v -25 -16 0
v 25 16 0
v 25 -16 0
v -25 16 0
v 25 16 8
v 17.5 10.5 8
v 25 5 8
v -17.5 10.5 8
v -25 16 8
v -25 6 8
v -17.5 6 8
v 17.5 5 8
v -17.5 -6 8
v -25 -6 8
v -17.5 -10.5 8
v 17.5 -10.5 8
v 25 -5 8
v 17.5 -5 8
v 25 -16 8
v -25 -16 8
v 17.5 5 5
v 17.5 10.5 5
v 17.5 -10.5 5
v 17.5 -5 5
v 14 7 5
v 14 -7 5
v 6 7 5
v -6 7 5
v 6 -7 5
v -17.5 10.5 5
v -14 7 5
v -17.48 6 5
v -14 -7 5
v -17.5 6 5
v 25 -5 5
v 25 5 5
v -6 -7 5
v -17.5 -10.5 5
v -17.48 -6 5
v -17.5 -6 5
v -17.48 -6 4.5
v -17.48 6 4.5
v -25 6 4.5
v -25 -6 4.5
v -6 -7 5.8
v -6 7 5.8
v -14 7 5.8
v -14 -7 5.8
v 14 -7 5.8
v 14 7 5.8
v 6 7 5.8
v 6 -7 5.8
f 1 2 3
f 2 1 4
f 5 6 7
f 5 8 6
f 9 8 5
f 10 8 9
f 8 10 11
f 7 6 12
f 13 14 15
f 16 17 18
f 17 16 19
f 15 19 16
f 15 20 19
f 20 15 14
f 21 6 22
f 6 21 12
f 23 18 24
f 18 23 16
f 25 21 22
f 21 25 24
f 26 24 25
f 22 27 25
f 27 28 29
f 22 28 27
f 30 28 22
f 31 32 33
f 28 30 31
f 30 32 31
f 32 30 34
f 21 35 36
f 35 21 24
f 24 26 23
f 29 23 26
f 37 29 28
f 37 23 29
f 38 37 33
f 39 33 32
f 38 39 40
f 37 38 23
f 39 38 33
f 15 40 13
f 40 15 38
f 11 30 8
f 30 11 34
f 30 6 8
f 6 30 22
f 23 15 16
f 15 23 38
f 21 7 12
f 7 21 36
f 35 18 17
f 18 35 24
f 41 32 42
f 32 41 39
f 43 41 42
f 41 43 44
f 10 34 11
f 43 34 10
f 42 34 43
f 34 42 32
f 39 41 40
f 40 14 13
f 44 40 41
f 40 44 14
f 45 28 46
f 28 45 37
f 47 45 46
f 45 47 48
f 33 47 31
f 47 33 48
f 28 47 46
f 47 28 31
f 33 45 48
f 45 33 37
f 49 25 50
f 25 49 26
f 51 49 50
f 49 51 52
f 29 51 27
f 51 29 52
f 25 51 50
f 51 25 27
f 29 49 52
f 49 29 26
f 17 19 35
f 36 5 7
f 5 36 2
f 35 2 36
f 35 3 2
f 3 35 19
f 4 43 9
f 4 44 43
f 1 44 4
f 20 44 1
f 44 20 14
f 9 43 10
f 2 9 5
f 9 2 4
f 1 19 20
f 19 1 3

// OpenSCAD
// file: single-jack-bench-termination-nest.scad
// Original shallow bench fixture; all dimensions in mm.
// Defaults are UNMEASURED example geometry, not a keystone compatibility claim.
part = "nest"; // [nest, contact_coupon]
base_length = 92;
base_width = 60;
base_thickness = 8;
base_radius = 4;
jack_length = 34;
jack_width = 20;
recess_depth = 3;
recess_clearance = 0.5; // Per side, loose location only.
support_land_width = 8; // X dimension of each raised bearing land.
support_land_length = 14; // Y dimension; both lands centered on Y=0.
support_land_spacing = 20; // X center-to-center separation.
support_land_height = 0.8;
cable_exit_width = 10;
latch_relief_width = 12;
latch_relief_length = 10; // Beyond the -X recess edge.
latch_relief_extra_depth = 0.5;
ear_width = 24; // X dimension.
ear_projection = 22; // Beyond each +/-Y edge of base.
ear_overlap = 8; // Join inside base; no holes or captive hardware.
ear_radius = 3;
clamp_pad_length = 14; // Actual pad X envelope, including pad articulation.
clamp_pad_width = 12; // Actual pad Y envelope.
clamp_pad_margin = 1;
coupon_length = 50;
coupon_width = 32;
// Measured lowest tool/hand working envelope above the bearing surface.
// The whole actual swept tool envelope must clear every fixture feature.
tool_bottom_above_support = 8;
tool_envelope_length = 40;
tool_envelope_width = 30;
minimum_floor = 3;
minimum_wall = 4;
minimum_land_width = 6;
minimum_land_length = 12;
minimum_ear_join = 4;
minimum_access_gap = 1;
$fn = 48;

cut_epsilon = 0.02;
recess_length = jack_length + 2 * recess_clearance;
recess_width = jack_width + 2 * recess_clearance;
floor_z = base_thickness - recess_depth;
support_z = floor_z + support_land_height;
ear_length = ear_projection + ear_overlap;

assert(part == "nest" || part == "contact_coupon", "part must be nest or contact_coupon");
assert(base_length > 0 && base_width > 0 && base_thickness > 0,
    "base dimensions must be positive");
assert(minimum_floor >= 3 && minimum_wall >= 4 && minimum_land_width >= 6 &&
    minimum_land_length >= 12 && minimum_ear_join >= 4 && minimum_access_gap >= 1,
    "minimum structural and access guards cannot be reduced");
assert(base_radius > 0 && base_radius < min(base_length, base_width) / 2,
    "base radius must preserve a straight-sided base");
assert(jack_length > 0 && jack_width > 0 && recess_depth > 0,
    "jack envelope and recess depth must be positive");
assert(recess_clearance > 0 && recess_clearance <= 2,
    "recess clearance must be positive and at most 2 mm per side");
assert(floor_z >= minimum_floor && floor_z - latch_relief_extra_depth >= minimum_floor,
    "recess and latch relief must preserve minimum floor");
assert(recess_length + 2 * (minimum_wall + base_radius) <= base_length &&
    recess_width + 2 * (minimum_wall + base_radius) <= base_width,
    "recess must preserve broad perimeter walls");
assert(support_land_width >= minimum_land_width && support_land_length >= minimum_land_length &&
    support_land_height > 0 && support_land_height <= recess_depth - minimum_access_gap,
    "support lands must retain broad bearing faces below locating walls");
assert(support_land_spacing > support_land_width &&
    support_land_spacing + support_land_width <= jack_length - 2 &&
    support_land_length <= jack_width - 2,
    "support lands must remain separated and inside housing footprint");
assert(cable_exit_width > 0 && cable_exit_width <= jack_width - 2,
    "cable exit must be open and narrower than housing");
assert(latch_relief_width > 0 && latch_relief_width <= jack_width - 2 &&
    latch_relief_length > 0 && latch_relief_extra_depth >= 0,
    "latch relief must be positive and inside housing width");
assert(latch_relief_length + recess_length / 2 <= base_length / 2 - minimum_wall,
    "latch relief must retain base end wall");
assert(ear_width > 0 && ear_projection > 0 && ear_overlap - ear_radius >= minimum_ear_join &&
    ear_overlap < base_width / 2 && ear_radius > 0 &&
    2 * ear_radius < min(ear_width, ear_length) &&
    ear_width + 2 * base_radius <= base_length,
    "ears must retain broad connected joins");
assert(clamp_pad_length > 0 && clamp_pad_width > 0 && clamp_pad_margin >= 1 &&
    ear_width - 2 * ear_radius >= clamp_pad_length + 2 * clamp_pad_margin &&
    ear_projection - 2 * ear_radius >= clamp_pad_width + 2 * clamp_pad_margin,
    "clamp pads must fit wholly on external ear flats");
assert(coupon_length >= recess_length + 2 * minimum_wall && coupon_length <= base_length &&
    coupon_width >= recess_width + 2 * minimum_wall && coupon_width <= base_width - 2 * base_radius,
    "contact coupon must retain recess walls and both lands");
assert(tool_envelope_length > 0 && tool_envelope_width > 0 &&
    tool_bottom_above_support > 0 &&
    support_z + tool_bottom_above_support >= base_thickness + minimum_access_gap,
    "tool envelope must clear fixture top by minimum access gap");

module rounded_outline(length, width, radius) {
    hull() for (x = [-length / 2 + radius, length / 2 - radius])
        for (y = [-width / 2 + radius, width / 2 - radius])
            translate([x, y]) circle(r = radius);
}

module stock() {
    linear_extrude(base_thickness) union() {
        rounded_outline(base_length, base_width, base_radius);
        for (side = [-1, 1])
            translate([0, side * (base_width / 2 + (ear_projection - ear_overlap) / 2)])
                rounded_outline(ear_width, ear_length, ear_radius);
    }
}

module nest() {
    union() {
        difference() {
            stock();
            // Flat continuous floor backs two raised housing bearing lands.
            translate([-recess_length / 2, -recess_width / 2, floor_z])
                cube([recess_length, recess_width, recess_depth + cut_epsilon]);
            // +X cable channel opens through the outer base edge.
            translate([recess_length / 2 - cut_epsilon, -cable_exit_width / 2, floor_z])
                cube([base_length / 2 + cut_epsilon, cable_exit_width, recess_depth + cut_epsilon]);
            // -X latch pocket is deeper than the contact floor and never a latch stop.
            translate([-recess_length / 2 - latch_relief_length, -latch_relief_width / 2,
                floor_z - latch_relief_extra_depth])
                cube([latch_relief_length + cut_epsilon, latch_relief_width,
                    recess_depth + latch_relief_extra_depth + cut_epsilon]);
        }
        for (side = [-1, 1])
            translate([side * support_land_spacing / 2 - support_land_width / 2,
                -support_land_length / 2, floor_z - cut_epsilon])
                cube([support_land_width, support_land_length, support_land_height + cut_epsilon]);
    }
}

if (part == "contact_coupon") {
    // Exact-source crop: both contact lands, full recess width, open channel stubs.
    intersection() {
        nest();
        translate([-coupon_length / 2, -coupon_width / 2, -cut_epsilon])
            cube([coupon_length, coupon_width, base_thickness + 2 * cut_epsilon]);
    }
} else nest();
// main file
// Exact-source contact sample. Dimensions and guards live in the main source.
include <single-jack-bench-termination-nest.scad>
part = "contact_coupon";
